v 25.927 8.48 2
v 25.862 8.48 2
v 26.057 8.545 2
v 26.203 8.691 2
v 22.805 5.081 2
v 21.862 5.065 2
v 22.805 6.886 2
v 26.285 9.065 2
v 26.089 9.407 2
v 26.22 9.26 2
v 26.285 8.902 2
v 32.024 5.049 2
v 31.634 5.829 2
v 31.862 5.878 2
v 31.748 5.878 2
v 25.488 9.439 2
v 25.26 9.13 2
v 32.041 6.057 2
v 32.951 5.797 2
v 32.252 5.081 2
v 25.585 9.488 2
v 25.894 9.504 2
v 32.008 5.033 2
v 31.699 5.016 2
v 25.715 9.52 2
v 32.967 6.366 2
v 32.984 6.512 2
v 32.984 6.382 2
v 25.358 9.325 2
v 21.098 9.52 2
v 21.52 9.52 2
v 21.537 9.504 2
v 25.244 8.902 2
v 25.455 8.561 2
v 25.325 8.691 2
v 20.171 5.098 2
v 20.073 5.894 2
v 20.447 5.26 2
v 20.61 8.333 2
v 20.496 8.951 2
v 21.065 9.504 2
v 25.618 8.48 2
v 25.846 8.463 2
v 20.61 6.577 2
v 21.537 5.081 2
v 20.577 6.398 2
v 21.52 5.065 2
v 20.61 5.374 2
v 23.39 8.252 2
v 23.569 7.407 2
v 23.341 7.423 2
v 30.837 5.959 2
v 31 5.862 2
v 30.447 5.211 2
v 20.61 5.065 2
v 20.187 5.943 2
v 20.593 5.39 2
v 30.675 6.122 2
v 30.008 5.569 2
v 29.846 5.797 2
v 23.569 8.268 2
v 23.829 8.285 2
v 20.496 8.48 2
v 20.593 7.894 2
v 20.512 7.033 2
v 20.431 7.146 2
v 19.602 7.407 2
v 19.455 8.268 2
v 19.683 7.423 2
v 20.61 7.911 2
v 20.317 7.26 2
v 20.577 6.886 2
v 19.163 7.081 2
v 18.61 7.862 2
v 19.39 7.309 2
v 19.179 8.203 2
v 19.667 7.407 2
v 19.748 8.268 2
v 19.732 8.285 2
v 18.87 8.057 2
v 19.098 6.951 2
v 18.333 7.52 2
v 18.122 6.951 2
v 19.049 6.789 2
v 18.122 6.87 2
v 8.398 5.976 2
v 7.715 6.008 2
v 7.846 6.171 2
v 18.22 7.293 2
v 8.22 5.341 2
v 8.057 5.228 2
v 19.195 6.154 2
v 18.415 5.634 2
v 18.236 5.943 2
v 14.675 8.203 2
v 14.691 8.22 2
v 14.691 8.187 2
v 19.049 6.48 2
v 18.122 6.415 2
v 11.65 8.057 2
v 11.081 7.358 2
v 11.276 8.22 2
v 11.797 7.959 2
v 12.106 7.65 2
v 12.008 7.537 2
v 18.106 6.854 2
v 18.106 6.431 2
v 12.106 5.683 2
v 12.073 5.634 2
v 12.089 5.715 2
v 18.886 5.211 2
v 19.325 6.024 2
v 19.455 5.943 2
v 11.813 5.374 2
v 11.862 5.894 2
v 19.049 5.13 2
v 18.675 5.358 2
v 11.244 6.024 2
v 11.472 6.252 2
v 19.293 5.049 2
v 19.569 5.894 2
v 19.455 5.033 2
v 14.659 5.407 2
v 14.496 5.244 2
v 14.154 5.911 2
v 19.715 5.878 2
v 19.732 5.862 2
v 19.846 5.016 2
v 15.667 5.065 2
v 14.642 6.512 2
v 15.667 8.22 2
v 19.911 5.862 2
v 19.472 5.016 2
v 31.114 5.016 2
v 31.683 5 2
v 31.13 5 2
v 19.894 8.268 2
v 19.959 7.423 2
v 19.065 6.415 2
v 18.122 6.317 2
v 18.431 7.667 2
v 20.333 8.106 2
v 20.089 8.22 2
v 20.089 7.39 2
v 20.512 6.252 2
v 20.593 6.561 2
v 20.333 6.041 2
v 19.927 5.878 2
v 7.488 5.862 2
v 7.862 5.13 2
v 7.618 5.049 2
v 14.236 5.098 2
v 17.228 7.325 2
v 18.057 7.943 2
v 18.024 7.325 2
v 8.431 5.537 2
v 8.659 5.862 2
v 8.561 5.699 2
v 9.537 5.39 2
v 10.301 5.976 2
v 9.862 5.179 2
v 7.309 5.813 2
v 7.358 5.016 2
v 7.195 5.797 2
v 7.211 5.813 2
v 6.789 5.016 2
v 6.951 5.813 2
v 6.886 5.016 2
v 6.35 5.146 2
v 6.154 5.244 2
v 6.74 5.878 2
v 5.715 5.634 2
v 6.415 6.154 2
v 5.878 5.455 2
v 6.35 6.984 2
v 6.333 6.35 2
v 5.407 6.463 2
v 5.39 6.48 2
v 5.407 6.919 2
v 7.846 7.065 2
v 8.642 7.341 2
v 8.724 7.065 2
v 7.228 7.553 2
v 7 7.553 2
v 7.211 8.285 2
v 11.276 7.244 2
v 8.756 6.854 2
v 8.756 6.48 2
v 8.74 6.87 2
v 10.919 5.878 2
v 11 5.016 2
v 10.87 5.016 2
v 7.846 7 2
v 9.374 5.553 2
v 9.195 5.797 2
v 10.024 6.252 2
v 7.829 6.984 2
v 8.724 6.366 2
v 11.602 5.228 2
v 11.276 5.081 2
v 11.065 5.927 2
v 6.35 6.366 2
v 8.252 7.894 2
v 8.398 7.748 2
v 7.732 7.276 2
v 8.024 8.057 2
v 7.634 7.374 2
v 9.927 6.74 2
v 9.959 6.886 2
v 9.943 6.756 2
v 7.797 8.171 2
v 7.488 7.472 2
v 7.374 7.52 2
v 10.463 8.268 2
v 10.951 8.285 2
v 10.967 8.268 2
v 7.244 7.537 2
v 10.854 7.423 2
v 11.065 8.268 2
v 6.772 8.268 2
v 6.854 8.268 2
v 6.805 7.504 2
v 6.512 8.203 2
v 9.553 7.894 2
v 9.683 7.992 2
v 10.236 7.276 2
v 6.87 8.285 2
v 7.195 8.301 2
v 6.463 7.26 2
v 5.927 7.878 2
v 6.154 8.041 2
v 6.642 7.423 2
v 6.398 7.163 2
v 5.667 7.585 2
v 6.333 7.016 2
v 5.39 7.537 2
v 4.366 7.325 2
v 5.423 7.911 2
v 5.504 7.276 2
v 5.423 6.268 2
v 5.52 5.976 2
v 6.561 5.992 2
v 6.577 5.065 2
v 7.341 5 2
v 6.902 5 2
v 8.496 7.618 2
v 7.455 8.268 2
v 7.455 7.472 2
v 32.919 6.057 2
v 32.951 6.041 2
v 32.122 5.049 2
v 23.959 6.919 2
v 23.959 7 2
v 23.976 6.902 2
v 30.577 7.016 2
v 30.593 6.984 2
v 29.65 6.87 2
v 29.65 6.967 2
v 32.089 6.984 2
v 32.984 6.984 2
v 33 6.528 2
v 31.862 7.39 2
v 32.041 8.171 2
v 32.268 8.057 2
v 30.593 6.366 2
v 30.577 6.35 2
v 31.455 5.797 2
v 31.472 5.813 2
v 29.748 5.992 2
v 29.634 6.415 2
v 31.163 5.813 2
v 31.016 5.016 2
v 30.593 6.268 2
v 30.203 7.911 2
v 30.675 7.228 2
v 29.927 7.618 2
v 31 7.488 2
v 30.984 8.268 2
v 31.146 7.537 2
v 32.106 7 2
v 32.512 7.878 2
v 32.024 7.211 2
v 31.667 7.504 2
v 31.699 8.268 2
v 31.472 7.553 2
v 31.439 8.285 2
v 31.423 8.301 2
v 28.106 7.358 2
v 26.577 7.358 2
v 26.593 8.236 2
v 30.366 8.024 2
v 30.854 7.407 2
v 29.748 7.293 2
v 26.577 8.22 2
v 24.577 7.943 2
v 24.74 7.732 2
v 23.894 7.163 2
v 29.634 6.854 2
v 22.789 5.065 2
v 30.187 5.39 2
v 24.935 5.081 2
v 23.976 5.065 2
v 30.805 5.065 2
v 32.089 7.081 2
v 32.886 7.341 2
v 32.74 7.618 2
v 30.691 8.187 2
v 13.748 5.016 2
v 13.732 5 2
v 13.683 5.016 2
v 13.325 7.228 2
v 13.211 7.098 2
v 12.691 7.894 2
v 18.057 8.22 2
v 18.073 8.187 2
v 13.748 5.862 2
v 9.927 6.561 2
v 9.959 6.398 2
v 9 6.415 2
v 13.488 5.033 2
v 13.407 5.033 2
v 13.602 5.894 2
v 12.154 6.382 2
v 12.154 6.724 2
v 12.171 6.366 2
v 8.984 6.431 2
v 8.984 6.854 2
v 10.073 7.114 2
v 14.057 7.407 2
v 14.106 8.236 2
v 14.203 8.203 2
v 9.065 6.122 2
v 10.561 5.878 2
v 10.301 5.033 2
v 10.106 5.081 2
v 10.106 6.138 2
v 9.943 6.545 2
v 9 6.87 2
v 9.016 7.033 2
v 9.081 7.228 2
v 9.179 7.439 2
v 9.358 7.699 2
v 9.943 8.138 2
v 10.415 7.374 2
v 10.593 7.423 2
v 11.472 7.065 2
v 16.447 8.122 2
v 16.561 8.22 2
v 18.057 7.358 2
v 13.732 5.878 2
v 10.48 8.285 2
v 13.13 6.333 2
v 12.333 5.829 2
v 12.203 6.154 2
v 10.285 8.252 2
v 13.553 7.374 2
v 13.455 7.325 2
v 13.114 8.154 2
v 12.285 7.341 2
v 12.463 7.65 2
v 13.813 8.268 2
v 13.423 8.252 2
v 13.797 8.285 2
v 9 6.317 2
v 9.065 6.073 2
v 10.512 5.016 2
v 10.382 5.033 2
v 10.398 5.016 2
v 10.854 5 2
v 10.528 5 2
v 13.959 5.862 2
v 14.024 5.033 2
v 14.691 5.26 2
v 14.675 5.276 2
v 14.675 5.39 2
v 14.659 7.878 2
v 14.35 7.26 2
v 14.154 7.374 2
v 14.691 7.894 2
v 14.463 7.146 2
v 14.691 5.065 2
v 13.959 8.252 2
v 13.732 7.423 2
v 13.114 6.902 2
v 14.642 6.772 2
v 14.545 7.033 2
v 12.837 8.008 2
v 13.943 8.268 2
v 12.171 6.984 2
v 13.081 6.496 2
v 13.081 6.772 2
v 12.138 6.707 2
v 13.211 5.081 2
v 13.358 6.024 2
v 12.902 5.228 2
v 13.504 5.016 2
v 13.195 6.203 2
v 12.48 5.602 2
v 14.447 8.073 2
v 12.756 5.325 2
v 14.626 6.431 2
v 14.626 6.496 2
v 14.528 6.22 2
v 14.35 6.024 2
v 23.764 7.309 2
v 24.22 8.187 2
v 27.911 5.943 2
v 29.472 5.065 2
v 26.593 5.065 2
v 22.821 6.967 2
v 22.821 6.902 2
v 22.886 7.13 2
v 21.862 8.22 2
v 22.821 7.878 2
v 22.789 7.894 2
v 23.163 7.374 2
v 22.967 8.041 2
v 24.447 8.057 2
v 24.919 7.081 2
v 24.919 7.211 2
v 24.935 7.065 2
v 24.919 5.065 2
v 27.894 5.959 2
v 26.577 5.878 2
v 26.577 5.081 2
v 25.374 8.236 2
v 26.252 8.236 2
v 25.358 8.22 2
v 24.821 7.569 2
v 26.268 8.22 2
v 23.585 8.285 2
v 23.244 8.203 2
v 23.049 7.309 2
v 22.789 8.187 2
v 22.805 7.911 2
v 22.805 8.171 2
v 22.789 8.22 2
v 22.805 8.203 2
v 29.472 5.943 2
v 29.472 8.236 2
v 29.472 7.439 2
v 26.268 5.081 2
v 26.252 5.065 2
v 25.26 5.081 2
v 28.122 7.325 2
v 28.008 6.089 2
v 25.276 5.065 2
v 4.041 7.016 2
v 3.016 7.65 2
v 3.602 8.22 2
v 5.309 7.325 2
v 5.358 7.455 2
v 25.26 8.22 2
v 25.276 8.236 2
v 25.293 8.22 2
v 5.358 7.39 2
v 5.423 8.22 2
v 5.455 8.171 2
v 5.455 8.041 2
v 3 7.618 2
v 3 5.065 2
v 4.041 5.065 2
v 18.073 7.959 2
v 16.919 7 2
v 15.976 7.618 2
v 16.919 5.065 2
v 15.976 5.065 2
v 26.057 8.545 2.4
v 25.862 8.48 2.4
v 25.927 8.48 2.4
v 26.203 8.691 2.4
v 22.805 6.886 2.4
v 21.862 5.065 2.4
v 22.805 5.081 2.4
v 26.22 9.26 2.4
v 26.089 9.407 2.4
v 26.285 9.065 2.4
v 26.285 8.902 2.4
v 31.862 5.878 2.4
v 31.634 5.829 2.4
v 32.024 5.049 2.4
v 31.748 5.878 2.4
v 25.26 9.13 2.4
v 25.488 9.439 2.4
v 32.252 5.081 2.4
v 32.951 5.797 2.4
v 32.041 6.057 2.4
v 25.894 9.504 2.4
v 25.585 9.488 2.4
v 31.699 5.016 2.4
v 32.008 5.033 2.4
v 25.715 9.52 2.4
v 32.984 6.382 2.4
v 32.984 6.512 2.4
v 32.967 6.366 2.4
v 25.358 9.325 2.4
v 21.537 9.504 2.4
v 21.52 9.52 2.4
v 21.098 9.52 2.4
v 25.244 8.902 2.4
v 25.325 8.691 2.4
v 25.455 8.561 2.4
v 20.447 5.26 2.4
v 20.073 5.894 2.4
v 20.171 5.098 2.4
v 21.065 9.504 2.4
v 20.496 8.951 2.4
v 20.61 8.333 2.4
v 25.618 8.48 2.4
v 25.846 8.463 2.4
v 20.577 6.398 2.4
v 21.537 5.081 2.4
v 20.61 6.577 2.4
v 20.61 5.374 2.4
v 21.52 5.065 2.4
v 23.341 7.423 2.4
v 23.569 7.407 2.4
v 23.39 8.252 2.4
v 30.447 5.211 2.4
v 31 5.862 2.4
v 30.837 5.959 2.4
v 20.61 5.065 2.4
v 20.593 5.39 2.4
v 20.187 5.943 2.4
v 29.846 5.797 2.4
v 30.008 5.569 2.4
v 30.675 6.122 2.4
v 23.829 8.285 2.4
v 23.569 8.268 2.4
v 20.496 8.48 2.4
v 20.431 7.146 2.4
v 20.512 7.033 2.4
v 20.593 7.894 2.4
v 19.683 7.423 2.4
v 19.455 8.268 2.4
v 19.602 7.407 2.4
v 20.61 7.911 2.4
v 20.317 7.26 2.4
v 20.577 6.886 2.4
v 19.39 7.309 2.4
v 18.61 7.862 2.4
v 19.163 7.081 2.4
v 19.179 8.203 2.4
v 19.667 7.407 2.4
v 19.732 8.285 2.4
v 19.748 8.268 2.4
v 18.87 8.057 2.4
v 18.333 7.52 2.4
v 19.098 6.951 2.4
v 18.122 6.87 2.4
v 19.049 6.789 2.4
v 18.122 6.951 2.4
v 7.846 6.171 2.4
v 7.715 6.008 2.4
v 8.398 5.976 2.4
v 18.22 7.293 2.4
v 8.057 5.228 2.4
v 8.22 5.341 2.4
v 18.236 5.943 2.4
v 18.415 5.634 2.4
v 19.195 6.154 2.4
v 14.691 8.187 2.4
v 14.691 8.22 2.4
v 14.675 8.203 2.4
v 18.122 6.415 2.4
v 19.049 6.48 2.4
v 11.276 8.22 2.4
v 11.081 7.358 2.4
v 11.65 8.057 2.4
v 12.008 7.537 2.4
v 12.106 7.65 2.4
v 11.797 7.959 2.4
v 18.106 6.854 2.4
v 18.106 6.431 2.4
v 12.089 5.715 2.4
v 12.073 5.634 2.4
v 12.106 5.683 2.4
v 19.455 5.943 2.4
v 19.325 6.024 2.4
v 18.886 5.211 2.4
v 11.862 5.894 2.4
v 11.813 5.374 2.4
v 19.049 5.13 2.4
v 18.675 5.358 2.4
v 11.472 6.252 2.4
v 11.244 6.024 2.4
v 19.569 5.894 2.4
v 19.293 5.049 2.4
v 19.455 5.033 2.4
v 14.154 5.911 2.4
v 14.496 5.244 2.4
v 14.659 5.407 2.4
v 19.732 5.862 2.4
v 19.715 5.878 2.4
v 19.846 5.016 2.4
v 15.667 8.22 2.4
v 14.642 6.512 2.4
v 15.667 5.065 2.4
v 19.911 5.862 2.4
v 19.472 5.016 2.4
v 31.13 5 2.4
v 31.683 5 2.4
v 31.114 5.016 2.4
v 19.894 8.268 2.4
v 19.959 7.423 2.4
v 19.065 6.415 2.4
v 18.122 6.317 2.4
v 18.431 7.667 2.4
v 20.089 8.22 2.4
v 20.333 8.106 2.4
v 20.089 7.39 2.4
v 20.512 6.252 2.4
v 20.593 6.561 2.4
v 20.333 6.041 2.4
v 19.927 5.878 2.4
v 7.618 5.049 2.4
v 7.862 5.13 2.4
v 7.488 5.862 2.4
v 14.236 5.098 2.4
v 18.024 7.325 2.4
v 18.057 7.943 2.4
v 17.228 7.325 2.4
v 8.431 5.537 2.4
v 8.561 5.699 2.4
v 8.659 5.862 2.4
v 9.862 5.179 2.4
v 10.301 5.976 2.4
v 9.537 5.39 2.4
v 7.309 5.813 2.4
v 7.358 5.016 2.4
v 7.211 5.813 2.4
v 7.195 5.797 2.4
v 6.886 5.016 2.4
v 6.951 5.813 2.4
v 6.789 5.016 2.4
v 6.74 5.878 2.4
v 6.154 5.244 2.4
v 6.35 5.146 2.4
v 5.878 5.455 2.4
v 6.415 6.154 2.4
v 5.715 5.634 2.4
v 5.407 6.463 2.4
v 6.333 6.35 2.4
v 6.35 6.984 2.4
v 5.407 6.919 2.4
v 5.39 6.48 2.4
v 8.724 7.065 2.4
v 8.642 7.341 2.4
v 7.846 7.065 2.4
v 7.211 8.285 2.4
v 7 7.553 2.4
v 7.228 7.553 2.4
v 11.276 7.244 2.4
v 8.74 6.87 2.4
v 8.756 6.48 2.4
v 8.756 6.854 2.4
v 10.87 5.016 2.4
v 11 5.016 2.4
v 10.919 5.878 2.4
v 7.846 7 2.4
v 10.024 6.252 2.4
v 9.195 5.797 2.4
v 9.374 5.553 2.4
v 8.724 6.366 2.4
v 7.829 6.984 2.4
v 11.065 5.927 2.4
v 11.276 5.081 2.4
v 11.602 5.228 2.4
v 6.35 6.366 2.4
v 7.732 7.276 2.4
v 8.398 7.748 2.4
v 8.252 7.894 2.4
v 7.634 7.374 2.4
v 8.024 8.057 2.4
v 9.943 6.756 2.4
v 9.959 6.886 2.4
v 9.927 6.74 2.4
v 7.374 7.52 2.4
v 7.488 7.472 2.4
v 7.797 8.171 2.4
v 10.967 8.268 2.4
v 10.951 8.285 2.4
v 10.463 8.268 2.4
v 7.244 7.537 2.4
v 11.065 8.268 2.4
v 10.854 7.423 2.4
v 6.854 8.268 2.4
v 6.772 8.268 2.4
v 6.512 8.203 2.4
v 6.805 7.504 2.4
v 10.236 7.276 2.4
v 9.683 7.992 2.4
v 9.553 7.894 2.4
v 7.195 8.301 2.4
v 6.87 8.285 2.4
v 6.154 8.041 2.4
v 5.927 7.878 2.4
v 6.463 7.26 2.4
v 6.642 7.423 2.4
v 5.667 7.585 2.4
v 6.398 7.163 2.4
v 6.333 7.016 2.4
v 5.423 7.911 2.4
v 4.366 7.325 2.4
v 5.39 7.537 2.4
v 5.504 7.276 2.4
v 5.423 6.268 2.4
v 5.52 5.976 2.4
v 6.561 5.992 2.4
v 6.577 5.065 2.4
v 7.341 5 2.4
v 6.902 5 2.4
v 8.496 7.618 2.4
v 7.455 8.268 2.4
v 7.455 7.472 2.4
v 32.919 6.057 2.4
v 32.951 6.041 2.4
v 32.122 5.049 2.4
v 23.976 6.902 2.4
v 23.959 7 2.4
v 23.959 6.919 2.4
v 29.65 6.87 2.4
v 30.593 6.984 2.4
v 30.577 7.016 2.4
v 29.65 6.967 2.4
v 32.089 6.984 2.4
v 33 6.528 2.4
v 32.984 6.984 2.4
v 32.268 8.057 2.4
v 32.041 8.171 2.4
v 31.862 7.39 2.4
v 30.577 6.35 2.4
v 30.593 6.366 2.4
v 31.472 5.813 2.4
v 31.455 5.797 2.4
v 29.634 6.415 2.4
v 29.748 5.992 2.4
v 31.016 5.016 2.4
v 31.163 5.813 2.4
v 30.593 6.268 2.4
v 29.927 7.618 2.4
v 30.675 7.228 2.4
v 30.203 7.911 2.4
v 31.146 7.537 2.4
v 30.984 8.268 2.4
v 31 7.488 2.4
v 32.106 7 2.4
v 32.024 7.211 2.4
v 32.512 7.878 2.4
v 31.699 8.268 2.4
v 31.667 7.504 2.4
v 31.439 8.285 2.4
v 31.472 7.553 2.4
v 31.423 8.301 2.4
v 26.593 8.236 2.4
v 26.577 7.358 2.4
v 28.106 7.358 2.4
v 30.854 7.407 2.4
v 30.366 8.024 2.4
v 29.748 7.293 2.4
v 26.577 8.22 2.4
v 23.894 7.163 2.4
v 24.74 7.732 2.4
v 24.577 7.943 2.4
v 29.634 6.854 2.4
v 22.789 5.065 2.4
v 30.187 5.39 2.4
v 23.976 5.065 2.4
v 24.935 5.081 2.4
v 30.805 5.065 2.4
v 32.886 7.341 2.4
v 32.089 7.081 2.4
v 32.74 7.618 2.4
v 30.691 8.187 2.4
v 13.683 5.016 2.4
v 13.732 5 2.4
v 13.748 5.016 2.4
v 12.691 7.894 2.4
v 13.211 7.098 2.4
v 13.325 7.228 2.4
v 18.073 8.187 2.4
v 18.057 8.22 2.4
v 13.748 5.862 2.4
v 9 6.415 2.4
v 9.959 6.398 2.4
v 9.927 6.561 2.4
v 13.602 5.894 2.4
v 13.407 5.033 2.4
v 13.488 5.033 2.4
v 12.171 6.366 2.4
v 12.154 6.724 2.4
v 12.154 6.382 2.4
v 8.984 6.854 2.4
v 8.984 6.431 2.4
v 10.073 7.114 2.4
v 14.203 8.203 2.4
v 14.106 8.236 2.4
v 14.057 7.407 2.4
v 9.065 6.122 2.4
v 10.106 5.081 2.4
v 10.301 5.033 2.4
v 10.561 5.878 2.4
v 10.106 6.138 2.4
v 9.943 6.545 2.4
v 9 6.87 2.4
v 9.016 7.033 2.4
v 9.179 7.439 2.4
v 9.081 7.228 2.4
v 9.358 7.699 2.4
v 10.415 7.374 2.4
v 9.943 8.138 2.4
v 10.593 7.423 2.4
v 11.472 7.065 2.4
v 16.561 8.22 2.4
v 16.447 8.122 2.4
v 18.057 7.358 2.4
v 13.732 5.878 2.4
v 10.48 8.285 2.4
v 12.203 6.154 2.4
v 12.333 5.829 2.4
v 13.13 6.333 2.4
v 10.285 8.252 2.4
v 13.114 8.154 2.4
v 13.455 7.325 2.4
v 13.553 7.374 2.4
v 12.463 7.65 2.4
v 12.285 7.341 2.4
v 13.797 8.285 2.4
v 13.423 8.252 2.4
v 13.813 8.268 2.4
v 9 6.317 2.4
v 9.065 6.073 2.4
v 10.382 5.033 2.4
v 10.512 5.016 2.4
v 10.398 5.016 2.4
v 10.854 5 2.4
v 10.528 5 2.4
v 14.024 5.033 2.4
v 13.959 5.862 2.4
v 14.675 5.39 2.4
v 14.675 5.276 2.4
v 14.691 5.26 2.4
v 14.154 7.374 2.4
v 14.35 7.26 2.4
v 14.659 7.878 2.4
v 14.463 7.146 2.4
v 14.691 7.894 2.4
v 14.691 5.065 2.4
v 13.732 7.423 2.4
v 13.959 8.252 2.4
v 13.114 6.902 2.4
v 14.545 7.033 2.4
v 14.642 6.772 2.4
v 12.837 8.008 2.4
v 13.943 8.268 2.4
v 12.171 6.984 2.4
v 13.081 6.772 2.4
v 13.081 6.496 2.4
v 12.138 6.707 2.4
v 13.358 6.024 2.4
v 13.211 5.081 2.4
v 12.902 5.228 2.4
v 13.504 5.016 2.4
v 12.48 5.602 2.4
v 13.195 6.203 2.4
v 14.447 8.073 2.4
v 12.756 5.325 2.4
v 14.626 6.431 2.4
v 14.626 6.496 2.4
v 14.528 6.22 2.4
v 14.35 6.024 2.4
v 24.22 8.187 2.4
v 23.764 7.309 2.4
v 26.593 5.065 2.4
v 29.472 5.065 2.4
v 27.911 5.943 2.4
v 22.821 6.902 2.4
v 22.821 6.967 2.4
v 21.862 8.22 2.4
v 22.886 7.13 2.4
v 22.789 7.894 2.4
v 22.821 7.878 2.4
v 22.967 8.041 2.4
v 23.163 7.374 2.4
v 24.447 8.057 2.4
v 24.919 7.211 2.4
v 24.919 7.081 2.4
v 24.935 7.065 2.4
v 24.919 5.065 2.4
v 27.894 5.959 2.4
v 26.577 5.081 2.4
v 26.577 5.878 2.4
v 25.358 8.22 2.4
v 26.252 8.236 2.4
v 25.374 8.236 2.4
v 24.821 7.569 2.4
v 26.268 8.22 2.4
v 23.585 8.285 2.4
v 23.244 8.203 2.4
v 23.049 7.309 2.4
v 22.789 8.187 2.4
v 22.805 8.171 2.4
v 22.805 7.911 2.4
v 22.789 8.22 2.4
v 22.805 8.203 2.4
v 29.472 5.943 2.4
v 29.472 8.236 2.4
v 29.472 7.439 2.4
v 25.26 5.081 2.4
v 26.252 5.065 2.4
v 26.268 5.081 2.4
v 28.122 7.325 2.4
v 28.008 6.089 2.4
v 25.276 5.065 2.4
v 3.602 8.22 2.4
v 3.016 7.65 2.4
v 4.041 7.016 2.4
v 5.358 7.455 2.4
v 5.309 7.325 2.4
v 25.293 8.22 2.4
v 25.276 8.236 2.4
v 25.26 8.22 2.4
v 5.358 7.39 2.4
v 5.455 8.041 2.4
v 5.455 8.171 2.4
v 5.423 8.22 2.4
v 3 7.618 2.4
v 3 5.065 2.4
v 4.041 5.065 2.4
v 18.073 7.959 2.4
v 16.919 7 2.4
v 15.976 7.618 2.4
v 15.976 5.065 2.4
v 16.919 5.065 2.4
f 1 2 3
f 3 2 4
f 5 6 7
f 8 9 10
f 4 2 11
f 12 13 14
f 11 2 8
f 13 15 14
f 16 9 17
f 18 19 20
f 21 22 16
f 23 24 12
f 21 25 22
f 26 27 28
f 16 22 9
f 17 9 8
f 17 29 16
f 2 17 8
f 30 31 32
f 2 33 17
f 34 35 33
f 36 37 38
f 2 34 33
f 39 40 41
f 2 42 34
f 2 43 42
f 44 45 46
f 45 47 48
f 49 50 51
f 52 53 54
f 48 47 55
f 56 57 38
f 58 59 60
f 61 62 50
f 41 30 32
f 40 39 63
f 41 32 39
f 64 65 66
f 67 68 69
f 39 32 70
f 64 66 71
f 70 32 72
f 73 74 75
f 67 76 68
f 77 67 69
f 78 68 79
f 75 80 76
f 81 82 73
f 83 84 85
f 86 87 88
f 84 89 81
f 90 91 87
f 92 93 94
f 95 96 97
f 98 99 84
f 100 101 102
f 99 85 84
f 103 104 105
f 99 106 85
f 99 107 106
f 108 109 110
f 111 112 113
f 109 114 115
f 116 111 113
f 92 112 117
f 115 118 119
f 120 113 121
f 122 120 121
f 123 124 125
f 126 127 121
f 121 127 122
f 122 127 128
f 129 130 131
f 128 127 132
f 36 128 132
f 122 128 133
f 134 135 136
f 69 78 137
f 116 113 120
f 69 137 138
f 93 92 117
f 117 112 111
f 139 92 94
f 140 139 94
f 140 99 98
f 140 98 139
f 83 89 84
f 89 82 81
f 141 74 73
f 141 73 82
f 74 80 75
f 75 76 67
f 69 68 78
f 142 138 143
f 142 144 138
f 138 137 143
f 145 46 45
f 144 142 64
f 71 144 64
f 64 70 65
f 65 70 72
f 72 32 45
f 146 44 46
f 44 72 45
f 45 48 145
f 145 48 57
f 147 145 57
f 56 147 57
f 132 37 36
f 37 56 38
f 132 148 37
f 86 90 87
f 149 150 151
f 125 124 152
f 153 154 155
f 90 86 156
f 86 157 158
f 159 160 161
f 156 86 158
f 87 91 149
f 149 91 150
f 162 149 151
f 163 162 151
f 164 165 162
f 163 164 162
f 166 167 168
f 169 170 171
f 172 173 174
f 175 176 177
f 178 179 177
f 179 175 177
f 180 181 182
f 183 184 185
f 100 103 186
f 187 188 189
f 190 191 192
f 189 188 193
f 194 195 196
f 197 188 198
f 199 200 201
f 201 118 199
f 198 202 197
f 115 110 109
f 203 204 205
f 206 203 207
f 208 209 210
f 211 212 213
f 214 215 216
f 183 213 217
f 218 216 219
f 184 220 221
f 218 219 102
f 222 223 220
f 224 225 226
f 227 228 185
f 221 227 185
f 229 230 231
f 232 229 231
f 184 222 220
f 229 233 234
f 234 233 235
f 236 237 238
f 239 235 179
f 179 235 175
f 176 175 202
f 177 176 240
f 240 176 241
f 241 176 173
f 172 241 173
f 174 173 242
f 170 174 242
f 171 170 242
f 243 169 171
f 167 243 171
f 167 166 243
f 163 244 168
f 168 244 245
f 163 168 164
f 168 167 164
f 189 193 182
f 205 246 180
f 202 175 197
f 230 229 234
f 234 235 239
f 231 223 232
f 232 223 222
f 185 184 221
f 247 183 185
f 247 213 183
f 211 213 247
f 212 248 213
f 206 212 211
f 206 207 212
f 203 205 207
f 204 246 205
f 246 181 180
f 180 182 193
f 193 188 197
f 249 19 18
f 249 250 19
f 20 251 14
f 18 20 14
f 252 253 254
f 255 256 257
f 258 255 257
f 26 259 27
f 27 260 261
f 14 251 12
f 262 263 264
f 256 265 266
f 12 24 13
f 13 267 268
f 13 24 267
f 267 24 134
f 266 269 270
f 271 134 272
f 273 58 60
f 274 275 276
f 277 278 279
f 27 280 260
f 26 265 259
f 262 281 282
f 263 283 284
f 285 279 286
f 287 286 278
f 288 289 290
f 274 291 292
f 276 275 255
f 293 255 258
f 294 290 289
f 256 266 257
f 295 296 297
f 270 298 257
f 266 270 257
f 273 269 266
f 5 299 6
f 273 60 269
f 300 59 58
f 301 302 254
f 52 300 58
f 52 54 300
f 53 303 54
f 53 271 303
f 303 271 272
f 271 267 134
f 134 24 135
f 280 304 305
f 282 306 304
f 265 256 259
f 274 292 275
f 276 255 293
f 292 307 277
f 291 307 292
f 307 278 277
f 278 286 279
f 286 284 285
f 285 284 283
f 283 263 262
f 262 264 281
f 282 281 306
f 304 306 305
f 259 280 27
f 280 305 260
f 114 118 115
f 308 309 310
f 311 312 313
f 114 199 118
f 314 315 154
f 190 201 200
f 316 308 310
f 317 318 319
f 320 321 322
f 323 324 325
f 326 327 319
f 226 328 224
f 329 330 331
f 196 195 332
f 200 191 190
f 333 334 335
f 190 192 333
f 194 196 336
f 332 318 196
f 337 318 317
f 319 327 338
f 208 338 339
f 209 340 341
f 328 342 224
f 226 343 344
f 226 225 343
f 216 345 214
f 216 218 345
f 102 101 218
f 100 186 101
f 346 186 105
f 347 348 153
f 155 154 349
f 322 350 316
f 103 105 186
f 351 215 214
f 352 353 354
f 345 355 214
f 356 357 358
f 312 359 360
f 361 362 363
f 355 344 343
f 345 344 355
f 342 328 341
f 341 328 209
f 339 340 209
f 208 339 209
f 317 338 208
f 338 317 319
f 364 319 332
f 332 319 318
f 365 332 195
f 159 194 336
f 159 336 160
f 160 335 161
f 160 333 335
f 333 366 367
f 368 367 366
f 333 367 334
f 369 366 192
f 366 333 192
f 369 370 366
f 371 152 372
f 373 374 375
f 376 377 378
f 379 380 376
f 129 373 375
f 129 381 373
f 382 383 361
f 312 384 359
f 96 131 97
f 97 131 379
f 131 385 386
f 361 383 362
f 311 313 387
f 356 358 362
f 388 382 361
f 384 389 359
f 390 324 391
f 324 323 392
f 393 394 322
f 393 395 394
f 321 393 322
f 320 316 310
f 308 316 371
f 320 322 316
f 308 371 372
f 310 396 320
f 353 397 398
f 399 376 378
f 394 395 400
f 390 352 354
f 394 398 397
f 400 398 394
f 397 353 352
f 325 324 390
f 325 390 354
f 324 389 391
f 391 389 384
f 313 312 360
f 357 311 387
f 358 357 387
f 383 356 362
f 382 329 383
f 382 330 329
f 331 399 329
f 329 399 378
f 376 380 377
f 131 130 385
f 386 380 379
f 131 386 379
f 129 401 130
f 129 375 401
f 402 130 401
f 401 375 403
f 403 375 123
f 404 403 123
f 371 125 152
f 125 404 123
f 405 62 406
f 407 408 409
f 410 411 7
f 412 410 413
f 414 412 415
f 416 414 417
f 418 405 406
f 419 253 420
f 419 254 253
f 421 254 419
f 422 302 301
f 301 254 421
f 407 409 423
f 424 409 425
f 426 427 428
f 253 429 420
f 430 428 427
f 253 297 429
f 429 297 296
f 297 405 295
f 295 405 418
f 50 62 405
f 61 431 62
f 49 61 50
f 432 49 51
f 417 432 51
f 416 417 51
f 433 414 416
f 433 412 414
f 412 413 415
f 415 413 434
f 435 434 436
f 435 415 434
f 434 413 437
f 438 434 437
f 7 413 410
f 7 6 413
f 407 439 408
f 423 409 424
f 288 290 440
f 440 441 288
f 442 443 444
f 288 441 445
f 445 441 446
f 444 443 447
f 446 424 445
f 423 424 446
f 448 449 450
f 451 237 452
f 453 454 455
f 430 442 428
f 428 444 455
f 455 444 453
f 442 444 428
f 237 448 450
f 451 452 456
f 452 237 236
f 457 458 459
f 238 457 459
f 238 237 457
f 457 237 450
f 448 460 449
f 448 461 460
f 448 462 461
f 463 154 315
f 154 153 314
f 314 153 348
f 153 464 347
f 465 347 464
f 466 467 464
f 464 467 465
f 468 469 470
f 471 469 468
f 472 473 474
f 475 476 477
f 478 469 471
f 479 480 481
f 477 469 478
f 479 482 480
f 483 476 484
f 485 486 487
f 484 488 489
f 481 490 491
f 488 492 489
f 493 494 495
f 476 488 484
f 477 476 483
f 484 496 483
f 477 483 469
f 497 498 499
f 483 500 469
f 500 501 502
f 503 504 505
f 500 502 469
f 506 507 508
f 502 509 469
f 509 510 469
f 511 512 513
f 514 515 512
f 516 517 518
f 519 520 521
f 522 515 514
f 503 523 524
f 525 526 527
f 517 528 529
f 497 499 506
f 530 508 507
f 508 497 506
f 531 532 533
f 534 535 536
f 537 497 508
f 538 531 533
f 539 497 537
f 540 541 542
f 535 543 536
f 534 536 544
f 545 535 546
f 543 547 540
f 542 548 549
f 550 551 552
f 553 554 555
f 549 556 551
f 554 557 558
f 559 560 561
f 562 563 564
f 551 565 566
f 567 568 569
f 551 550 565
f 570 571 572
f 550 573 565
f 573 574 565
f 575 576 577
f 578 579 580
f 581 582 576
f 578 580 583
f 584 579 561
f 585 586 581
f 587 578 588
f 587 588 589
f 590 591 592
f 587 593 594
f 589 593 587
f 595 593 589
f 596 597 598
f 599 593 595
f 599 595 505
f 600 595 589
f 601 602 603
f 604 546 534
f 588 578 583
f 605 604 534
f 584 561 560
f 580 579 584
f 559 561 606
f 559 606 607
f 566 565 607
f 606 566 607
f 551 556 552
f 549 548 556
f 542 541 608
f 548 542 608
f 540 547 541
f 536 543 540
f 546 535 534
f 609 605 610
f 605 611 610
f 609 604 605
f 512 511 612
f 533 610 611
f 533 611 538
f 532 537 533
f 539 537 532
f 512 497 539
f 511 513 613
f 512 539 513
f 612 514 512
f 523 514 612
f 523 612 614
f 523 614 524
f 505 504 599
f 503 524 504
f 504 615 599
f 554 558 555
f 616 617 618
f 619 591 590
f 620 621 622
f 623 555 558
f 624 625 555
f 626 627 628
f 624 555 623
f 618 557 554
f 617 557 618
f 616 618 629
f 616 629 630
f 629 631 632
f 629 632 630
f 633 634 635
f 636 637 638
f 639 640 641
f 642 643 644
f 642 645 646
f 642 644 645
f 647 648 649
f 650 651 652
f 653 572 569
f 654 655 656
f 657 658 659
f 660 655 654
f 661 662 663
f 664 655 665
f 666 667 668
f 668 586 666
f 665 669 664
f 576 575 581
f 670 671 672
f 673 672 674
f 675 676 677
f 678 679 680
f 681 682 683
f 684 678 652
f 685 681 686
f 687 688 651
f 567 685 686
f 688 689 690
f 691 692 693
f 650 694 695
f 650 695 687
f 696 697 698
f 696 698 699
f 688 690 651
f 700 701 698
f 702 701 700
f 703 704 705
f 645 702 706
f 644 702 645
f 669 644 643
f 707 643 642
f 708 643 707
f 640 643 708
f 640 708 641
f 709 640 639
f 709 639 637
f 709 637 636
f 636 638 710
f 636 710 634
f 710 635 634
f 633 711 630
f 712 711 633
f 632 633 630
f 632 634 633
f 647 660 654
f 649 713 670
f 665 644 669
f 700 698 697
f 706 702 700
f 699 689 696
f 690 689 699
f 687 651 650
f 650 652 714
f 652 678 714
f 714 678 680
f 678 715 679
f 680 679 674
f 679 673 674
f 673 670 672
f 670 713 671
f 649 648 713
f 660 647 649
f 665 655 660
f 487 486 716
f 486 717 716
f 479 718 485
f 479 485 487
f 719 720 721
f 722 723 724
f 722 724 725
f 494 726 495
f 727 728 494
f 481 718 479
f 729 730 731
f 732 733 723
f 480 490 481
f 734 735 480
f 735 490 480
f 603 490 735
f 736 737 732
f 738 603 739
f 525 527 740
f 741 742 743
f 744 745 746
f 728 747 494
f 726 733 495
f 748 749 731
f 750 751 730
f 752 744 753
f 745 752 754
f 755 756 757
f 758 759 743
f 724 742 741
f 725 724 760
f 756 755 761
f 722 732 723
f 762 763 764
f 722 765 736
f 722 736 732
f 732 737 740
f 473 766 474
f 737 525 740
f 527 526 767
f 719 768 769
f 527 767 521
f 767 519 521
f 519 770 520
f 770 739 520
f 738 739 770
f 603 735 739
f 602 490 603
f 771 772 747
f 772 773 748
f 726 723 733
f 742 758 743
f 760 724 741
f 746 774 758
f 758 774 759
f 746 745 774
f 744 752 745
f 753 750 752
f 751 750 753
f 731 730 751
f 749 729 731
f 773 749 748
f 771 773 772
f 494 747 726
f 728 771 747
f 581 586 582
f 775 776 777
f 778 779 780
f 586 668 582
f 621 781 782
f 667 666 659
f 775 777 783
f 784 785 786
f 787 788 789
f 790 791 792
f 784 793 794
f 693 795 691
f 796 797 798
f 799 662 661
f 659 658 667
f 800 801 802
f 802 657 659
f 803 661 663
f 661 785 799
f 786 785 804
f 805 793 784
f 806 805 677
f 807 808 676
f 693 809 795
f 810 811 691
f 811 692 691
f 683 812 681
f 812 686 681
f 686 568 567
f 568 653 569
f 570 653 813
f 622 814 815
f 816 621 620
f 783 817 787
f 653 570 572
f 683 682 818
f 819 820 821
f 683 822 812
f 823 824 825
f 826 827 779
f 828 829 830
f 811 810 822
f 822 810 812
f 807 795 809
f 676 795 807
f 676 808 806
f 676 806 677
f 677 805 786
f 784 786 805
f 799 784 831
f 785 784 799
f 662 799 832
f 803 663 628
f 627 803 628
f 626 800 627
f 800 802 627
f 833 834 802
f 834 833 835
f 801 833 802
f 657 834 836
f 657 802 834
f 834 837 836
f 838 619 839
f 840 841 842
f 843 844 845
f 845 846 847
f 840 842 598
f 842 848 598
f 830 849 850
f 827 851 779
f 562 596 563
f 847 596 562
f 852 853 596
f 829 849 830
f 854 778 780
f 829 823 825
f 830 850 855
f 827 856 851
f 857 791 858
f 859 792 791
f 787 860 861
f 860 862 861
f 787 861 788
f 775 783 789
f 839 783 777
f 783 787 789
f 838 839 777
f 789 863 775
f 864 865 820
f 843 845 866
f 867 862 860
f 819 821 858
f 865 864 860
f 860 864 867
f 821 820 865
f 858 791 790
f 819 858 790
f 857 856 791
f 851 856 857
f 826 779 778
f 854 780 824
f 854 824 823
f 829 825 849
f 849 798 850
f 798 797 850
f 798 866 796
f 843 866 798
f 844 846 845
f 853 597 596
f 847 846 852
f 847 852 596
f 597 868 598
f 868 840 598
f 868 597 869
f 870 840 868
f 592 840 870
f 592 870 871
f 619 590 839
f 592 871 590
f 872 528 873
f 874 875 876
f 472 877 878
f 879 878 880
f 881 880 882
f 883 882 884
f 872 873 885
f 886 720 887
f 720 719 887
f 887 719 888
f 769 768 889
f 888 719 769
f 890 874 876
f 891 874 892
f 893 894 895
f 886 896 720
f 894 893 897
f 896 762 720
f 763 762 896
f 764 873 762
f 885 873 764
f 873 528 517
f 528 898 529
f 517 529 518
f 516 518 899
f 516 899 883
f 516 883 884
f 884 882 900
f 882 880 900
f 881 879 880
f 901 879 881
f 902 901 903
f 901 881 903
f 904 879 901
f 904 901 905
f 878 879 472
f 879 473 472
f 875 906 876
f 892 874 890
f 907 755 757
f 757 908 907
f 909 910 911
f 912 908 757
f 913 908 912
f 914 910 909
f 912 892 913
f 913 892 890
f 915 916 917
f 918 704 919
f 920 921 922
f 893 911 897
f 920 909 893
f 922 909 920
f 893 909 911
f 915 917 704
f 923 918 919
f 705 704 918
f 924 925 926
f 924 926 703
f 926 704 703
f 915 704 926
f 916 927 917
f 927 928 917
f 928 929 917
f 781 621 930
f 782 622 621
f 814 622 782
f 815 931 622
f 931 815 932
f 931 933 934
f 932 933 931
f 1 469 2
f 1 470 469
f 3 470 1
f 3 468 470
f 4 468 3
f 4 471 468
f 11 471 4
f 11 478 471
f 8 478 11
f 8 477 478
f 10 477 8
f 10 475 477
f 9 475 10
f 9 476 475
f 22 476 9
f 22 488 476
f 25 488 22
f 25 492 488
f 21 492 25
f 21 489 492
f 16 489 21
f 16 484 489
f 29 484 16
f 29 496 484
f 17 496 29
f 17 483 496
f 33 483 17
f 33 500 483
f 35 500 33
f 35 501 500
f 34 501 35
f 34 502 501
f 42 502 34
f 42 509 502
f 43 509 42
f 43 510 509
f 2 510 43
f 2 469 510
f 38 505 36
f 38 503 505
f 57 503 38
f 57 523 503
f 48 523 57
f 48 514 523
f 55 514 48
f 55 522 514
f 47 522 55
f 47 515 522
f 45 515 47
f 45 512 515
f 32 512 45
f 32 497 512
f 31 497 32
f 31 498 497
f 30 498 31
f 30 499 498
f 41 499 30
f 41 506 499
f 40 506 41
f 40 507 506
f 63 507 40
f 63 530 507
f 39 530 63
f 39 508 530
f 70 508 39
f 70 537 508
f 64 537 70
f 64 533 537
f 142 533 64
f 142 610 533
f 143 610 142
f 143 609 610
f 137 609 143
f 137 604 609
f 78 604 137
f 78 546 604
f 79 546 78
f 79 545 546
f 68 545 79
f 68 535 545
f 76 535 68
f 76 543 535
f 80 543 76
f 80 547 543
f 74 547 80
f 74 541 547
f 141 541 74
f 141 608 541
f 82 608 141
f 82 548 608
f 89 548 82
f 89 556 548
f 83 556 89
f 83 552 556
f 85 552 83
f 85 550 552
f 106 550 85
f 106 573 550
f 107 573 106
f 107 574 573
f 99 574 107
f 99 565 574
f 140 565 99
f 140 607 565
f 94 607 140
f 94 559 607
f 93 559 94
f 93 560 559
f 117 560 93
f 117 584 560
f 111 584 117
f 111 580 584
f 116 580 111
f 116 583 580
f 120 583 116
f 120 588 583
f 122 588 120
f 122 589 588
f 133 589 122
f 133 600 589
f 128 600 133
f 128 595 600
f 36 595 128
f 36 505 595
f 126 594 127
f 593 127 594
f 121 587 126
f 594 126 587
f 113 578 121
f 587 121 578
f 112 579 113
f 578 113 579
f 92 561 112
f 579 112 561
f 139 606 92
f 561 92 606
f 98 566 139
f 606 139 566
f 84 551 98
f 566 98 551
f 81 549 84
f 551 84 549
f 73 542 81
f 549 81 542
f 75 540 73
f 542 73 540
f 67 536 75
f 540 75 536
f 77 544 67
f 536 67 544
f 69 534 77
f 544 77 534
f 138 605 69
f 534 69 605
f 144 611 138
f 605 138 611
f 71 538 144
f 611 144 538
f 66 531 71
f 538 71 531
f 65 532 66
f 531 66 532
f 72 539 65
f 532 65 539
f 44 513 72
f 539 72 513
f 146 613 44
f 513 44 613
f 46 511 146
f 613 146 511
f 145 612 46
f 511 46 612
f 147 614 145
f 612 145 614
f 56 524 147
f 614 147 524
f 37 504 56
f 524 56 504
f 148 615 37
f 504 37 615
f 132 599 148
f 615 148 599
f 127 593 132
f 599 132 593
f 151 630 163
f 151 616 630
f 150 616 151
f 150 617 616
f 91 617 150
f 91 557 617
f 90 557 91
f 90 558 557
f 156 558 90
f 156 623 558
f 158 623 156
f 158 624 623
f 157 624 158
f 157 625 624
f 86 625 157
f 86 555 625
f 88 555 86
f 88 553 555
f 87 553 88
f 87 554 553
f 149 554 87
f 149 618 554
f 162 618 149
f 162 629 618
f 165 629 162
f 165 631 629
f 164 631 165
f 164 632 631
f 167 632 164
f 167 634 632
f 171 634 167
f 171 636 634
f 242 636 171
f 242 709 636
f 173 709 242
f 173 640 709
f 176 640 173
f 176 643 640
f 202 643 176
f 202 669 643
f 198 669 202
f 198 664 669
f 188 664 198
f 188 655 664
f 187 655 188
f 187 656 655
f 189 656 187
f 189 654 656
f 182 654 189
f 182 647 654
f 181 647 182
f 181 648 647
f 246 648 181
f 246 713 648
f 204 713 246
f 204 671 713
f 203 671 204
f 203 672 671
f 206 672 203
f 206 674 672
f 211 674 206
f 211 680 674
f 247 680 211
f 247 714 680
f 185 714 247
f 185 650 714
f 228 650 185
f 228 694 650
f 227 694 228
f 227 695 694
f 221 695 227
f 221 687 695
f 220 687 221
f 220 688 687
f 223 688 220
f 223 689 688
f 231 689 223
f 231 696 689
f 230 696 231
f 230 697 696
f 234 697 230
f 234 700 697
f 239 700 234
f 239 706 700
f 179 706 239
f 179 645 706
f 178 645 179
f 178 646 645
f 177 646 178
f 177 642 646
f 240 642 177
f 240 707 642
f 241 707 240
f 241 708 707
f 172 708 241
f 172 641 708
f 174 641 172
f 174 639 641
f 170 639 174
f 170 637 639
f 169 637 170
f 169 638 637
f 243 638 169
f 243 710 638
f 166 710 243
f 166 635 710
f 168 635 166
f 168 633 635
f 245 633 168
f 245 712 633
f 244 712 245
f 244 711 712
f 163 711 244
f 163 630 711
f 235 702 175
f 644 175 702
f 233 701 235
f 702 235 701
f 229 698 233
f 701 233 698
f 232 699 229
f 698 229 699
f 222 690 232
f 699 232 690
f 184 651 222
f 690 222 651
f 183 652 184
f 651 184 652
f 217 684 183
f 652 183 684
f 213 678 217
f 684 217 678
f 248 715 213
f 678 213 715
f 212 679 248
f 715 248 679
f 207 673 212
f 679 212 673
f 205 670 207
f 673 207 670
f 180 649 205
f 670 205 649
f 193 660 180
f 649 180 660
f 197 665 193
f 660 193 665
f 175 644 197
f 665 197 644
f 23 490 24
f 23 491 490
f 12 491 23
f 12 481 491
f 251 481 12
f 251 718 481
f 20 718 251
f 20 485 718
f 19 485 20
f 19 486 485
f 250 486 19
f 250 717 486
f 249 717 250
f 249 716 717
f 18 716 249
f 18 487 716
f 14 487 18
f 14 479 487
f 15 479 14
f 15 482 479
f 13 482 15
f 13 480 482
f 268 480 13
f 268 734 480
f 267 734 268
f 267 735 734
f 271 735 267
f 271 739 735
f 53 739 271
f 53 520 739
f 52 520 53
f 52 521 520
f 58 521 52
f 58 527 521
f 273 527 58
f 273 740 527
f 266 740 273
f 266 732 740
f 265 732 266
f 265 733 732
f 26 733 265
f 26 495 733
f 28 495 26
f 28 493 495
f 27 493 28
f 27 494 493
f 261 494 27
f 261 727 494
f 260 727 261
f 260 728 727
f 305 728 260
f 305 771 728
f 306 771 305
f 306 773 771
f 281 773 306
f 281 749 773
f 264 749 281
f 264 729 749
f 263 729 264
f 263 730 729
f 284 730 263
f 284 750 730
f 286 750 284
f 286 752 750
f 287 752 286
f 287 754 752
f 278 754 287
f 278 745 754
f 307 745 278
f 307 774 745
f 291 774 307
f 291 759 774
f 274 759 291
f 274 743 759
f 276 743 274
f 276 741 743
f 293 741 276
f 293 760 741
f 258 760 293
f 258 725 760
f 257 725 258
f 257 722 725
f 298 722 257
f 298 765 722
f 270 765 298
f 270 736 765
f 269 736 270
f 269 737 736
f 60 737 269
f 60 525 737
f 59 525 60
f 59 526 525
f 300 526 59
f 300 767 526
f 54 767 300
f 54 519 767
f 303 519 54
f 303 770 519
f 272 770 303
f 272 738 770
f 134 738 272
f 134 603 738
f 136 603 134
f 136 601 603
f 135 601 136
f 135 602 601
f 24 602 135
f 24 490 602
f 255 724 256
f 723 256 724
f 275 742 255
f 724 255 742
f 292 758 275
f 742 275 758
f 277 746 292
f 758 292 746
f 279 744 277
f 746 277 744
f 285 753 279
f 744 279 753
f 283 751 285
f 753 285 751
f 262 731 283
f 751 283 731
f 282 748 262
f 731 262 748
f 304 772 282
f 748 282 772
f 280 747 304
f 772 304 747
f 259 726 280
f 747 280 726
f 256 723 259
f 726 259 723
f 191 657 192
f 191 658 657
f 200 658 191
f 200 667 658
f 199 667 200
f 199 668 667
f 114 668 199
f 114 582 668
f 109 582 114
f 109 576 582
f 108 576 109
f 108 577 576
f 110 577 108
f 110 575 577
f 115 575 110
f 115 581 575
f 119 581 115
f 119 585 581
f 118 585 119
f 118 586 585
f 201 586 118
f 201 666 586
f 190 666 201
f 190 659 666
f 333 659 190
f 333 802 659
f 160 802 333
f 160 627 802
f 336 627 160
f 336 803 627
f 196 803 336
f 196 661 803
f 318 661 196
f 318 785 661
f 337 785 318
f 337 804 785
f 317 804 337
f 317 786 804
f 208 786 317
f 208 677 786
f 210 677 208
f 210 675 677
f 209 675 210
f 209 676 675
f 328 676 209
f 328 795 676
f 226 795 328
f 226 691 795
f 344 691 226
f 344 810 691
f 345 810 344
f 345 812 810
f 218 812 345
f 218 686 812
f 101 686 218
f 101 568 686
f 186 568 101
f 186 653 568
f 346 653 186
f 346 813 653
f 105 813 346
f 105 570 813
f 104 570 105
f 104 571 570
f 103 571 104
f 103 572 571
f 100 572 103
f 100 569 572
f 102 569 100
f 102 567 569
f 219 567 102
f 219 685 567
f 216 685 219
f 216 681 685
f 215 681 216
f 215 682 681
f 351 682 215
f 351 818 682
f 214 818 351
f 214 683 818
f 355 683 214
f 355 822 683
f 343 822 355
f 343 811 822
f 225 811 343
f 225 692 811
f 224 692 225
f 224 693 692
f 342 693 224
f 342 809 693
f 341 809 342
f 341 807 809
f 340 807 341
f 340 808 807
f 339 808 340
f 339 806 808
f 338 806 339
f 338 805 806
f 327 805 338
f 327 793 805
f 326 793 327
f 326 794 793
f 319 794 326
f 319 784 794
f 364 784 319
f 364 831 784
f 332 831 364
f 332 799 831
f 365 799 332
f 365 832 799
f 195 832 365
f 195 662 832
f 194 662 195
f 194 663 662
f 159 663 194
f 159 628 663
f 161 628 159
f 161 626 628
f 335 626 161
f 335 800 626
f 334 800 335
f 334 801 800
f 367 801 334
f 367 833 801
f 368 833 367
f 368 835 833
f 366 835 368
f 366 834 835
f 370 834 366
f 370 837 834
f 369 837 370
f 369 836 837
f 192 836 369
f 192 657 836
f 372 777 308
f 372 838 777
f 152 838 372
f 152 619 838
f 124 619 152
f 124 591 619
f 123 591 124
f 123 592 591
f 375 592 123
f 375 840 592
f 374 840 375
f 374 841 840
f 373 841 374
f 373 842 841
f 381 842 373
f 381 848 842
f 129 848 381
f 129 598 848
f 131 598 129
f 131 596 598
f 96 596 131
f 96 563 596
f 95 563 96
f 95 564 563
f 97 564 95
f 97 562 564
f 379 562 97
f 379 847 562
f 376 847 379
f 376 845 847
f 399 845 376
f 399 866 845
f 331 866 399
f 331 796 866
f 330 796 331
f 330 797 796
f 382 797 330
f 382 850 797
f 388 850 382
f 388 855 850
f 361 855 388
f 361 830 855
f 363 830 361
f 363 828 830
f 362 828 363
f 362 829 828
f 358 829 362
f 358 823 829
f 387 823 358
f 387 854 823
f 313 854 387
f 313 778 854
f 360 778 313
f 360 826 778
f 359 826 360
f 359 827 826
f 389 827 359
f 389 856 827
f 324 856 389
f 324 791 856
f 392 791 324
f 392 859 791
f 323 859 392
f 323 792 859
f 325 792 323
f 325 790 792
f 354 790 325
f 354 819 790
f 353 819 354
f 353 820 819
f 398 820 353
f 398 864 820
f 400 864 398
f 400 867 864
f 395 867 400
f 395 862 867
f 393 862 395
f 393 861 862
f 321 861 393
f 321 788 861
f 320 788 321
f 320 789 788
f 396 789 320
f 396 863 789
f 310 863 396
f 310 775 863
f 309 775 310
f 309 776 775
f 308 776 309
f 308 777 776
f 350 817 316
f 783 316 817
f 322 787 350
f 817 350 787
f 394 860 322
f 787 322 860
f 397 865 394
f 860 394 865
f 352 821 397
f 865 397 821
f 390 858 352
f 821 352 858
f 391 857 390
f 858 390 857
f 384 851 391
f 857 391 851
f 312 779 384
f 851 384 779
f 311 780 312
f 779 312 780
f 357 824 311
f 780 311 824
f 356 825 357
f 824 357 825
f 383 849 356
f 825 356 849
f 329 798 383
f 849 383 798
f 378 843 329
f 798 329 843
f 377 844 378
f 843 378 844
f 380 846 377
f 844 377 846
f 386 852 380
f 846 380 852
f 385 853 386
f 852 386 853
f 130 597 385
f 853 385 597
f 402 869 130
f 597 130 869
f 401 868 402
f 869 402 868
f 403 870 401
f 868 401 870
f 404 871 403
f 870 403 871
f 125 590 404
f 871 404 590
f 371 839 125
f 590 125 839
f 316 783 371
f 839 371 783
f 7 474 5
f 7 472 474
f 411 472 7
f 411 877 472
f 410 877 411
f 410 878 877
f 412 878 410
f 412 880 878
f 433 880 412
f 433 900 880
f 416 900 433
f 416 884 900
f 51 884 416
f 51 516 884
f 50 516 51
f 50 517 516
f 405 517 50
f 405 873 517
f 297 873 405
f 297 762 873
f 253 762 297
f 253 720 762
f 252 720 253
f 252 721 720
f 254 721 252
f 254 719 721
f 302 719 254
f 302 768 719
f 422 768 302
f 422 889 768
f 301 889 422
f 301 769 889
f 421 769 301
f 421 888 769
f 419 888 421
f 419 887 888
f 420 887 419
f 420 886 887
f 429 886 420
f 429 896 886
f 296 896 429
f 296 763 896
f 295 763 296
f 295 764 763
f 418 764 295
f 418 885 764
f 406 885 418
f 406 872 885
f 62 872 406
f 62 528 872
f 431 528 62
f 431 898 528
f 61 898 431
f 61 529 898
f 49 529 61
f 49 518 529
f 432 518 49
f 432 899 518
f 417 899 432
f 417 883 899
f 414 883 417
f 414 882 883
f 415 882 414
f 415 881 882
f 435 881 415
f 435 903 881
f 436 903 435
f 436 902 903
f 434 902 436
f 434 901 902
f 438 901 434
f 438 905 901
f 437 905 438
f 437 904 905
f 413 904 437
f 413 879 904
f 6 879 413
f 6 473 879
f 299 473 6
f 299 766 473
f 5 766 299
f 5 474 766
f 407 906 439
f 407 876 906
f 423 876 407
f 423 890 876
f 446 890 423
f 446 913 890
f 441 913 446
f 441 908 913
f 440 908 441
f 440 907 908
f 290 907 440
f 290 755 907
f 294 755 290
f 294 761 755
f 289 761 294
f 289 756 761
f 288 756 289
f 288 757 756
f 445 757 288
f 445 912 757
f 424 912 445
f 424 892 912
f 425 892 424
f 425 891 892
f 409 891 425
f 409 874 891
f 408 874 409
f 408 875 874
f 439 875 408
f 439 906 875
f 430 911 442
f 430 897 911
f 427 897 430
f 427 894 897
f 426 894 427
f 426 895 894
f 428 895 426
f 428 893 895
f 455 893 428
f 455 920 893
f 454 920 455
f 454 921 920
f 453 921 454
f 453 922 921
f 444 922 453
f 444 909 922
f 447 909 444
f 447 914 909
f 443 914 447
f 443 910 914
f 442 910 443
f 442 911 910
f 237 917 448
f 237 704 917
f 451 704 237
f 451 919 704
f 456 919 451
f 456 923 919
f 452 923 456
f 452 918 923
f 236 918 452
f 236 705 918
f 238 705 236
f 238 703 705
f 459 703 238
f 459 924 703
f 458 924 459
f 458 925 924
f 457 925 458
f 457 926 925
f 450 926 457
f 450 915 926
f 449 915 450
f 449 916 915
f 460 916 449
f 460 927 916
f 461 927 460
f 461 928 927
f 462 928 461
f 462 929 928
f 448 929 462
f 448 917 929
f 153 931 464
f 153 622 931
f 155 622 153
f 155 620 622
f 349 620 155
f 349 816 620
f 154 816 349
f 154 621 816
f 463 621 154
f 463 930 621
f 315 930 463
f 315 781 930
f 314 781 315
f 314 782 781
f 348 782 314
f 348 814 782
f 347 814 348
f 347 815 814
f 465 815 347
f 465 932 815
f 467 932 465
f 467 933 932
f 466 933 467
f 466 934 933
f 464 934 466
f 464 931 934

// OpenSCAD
// Integration smoke test. use imports the module, not the standalone 0.6 mm logo.
// Expected bounds: X=3..33, Y=5..9.5203252033, Z=2..2.4 mm.
use <../recardnize-logo.scad>

translate([3, 5, 2])
  recardnize_logo(width = 30, height = 0.4);
